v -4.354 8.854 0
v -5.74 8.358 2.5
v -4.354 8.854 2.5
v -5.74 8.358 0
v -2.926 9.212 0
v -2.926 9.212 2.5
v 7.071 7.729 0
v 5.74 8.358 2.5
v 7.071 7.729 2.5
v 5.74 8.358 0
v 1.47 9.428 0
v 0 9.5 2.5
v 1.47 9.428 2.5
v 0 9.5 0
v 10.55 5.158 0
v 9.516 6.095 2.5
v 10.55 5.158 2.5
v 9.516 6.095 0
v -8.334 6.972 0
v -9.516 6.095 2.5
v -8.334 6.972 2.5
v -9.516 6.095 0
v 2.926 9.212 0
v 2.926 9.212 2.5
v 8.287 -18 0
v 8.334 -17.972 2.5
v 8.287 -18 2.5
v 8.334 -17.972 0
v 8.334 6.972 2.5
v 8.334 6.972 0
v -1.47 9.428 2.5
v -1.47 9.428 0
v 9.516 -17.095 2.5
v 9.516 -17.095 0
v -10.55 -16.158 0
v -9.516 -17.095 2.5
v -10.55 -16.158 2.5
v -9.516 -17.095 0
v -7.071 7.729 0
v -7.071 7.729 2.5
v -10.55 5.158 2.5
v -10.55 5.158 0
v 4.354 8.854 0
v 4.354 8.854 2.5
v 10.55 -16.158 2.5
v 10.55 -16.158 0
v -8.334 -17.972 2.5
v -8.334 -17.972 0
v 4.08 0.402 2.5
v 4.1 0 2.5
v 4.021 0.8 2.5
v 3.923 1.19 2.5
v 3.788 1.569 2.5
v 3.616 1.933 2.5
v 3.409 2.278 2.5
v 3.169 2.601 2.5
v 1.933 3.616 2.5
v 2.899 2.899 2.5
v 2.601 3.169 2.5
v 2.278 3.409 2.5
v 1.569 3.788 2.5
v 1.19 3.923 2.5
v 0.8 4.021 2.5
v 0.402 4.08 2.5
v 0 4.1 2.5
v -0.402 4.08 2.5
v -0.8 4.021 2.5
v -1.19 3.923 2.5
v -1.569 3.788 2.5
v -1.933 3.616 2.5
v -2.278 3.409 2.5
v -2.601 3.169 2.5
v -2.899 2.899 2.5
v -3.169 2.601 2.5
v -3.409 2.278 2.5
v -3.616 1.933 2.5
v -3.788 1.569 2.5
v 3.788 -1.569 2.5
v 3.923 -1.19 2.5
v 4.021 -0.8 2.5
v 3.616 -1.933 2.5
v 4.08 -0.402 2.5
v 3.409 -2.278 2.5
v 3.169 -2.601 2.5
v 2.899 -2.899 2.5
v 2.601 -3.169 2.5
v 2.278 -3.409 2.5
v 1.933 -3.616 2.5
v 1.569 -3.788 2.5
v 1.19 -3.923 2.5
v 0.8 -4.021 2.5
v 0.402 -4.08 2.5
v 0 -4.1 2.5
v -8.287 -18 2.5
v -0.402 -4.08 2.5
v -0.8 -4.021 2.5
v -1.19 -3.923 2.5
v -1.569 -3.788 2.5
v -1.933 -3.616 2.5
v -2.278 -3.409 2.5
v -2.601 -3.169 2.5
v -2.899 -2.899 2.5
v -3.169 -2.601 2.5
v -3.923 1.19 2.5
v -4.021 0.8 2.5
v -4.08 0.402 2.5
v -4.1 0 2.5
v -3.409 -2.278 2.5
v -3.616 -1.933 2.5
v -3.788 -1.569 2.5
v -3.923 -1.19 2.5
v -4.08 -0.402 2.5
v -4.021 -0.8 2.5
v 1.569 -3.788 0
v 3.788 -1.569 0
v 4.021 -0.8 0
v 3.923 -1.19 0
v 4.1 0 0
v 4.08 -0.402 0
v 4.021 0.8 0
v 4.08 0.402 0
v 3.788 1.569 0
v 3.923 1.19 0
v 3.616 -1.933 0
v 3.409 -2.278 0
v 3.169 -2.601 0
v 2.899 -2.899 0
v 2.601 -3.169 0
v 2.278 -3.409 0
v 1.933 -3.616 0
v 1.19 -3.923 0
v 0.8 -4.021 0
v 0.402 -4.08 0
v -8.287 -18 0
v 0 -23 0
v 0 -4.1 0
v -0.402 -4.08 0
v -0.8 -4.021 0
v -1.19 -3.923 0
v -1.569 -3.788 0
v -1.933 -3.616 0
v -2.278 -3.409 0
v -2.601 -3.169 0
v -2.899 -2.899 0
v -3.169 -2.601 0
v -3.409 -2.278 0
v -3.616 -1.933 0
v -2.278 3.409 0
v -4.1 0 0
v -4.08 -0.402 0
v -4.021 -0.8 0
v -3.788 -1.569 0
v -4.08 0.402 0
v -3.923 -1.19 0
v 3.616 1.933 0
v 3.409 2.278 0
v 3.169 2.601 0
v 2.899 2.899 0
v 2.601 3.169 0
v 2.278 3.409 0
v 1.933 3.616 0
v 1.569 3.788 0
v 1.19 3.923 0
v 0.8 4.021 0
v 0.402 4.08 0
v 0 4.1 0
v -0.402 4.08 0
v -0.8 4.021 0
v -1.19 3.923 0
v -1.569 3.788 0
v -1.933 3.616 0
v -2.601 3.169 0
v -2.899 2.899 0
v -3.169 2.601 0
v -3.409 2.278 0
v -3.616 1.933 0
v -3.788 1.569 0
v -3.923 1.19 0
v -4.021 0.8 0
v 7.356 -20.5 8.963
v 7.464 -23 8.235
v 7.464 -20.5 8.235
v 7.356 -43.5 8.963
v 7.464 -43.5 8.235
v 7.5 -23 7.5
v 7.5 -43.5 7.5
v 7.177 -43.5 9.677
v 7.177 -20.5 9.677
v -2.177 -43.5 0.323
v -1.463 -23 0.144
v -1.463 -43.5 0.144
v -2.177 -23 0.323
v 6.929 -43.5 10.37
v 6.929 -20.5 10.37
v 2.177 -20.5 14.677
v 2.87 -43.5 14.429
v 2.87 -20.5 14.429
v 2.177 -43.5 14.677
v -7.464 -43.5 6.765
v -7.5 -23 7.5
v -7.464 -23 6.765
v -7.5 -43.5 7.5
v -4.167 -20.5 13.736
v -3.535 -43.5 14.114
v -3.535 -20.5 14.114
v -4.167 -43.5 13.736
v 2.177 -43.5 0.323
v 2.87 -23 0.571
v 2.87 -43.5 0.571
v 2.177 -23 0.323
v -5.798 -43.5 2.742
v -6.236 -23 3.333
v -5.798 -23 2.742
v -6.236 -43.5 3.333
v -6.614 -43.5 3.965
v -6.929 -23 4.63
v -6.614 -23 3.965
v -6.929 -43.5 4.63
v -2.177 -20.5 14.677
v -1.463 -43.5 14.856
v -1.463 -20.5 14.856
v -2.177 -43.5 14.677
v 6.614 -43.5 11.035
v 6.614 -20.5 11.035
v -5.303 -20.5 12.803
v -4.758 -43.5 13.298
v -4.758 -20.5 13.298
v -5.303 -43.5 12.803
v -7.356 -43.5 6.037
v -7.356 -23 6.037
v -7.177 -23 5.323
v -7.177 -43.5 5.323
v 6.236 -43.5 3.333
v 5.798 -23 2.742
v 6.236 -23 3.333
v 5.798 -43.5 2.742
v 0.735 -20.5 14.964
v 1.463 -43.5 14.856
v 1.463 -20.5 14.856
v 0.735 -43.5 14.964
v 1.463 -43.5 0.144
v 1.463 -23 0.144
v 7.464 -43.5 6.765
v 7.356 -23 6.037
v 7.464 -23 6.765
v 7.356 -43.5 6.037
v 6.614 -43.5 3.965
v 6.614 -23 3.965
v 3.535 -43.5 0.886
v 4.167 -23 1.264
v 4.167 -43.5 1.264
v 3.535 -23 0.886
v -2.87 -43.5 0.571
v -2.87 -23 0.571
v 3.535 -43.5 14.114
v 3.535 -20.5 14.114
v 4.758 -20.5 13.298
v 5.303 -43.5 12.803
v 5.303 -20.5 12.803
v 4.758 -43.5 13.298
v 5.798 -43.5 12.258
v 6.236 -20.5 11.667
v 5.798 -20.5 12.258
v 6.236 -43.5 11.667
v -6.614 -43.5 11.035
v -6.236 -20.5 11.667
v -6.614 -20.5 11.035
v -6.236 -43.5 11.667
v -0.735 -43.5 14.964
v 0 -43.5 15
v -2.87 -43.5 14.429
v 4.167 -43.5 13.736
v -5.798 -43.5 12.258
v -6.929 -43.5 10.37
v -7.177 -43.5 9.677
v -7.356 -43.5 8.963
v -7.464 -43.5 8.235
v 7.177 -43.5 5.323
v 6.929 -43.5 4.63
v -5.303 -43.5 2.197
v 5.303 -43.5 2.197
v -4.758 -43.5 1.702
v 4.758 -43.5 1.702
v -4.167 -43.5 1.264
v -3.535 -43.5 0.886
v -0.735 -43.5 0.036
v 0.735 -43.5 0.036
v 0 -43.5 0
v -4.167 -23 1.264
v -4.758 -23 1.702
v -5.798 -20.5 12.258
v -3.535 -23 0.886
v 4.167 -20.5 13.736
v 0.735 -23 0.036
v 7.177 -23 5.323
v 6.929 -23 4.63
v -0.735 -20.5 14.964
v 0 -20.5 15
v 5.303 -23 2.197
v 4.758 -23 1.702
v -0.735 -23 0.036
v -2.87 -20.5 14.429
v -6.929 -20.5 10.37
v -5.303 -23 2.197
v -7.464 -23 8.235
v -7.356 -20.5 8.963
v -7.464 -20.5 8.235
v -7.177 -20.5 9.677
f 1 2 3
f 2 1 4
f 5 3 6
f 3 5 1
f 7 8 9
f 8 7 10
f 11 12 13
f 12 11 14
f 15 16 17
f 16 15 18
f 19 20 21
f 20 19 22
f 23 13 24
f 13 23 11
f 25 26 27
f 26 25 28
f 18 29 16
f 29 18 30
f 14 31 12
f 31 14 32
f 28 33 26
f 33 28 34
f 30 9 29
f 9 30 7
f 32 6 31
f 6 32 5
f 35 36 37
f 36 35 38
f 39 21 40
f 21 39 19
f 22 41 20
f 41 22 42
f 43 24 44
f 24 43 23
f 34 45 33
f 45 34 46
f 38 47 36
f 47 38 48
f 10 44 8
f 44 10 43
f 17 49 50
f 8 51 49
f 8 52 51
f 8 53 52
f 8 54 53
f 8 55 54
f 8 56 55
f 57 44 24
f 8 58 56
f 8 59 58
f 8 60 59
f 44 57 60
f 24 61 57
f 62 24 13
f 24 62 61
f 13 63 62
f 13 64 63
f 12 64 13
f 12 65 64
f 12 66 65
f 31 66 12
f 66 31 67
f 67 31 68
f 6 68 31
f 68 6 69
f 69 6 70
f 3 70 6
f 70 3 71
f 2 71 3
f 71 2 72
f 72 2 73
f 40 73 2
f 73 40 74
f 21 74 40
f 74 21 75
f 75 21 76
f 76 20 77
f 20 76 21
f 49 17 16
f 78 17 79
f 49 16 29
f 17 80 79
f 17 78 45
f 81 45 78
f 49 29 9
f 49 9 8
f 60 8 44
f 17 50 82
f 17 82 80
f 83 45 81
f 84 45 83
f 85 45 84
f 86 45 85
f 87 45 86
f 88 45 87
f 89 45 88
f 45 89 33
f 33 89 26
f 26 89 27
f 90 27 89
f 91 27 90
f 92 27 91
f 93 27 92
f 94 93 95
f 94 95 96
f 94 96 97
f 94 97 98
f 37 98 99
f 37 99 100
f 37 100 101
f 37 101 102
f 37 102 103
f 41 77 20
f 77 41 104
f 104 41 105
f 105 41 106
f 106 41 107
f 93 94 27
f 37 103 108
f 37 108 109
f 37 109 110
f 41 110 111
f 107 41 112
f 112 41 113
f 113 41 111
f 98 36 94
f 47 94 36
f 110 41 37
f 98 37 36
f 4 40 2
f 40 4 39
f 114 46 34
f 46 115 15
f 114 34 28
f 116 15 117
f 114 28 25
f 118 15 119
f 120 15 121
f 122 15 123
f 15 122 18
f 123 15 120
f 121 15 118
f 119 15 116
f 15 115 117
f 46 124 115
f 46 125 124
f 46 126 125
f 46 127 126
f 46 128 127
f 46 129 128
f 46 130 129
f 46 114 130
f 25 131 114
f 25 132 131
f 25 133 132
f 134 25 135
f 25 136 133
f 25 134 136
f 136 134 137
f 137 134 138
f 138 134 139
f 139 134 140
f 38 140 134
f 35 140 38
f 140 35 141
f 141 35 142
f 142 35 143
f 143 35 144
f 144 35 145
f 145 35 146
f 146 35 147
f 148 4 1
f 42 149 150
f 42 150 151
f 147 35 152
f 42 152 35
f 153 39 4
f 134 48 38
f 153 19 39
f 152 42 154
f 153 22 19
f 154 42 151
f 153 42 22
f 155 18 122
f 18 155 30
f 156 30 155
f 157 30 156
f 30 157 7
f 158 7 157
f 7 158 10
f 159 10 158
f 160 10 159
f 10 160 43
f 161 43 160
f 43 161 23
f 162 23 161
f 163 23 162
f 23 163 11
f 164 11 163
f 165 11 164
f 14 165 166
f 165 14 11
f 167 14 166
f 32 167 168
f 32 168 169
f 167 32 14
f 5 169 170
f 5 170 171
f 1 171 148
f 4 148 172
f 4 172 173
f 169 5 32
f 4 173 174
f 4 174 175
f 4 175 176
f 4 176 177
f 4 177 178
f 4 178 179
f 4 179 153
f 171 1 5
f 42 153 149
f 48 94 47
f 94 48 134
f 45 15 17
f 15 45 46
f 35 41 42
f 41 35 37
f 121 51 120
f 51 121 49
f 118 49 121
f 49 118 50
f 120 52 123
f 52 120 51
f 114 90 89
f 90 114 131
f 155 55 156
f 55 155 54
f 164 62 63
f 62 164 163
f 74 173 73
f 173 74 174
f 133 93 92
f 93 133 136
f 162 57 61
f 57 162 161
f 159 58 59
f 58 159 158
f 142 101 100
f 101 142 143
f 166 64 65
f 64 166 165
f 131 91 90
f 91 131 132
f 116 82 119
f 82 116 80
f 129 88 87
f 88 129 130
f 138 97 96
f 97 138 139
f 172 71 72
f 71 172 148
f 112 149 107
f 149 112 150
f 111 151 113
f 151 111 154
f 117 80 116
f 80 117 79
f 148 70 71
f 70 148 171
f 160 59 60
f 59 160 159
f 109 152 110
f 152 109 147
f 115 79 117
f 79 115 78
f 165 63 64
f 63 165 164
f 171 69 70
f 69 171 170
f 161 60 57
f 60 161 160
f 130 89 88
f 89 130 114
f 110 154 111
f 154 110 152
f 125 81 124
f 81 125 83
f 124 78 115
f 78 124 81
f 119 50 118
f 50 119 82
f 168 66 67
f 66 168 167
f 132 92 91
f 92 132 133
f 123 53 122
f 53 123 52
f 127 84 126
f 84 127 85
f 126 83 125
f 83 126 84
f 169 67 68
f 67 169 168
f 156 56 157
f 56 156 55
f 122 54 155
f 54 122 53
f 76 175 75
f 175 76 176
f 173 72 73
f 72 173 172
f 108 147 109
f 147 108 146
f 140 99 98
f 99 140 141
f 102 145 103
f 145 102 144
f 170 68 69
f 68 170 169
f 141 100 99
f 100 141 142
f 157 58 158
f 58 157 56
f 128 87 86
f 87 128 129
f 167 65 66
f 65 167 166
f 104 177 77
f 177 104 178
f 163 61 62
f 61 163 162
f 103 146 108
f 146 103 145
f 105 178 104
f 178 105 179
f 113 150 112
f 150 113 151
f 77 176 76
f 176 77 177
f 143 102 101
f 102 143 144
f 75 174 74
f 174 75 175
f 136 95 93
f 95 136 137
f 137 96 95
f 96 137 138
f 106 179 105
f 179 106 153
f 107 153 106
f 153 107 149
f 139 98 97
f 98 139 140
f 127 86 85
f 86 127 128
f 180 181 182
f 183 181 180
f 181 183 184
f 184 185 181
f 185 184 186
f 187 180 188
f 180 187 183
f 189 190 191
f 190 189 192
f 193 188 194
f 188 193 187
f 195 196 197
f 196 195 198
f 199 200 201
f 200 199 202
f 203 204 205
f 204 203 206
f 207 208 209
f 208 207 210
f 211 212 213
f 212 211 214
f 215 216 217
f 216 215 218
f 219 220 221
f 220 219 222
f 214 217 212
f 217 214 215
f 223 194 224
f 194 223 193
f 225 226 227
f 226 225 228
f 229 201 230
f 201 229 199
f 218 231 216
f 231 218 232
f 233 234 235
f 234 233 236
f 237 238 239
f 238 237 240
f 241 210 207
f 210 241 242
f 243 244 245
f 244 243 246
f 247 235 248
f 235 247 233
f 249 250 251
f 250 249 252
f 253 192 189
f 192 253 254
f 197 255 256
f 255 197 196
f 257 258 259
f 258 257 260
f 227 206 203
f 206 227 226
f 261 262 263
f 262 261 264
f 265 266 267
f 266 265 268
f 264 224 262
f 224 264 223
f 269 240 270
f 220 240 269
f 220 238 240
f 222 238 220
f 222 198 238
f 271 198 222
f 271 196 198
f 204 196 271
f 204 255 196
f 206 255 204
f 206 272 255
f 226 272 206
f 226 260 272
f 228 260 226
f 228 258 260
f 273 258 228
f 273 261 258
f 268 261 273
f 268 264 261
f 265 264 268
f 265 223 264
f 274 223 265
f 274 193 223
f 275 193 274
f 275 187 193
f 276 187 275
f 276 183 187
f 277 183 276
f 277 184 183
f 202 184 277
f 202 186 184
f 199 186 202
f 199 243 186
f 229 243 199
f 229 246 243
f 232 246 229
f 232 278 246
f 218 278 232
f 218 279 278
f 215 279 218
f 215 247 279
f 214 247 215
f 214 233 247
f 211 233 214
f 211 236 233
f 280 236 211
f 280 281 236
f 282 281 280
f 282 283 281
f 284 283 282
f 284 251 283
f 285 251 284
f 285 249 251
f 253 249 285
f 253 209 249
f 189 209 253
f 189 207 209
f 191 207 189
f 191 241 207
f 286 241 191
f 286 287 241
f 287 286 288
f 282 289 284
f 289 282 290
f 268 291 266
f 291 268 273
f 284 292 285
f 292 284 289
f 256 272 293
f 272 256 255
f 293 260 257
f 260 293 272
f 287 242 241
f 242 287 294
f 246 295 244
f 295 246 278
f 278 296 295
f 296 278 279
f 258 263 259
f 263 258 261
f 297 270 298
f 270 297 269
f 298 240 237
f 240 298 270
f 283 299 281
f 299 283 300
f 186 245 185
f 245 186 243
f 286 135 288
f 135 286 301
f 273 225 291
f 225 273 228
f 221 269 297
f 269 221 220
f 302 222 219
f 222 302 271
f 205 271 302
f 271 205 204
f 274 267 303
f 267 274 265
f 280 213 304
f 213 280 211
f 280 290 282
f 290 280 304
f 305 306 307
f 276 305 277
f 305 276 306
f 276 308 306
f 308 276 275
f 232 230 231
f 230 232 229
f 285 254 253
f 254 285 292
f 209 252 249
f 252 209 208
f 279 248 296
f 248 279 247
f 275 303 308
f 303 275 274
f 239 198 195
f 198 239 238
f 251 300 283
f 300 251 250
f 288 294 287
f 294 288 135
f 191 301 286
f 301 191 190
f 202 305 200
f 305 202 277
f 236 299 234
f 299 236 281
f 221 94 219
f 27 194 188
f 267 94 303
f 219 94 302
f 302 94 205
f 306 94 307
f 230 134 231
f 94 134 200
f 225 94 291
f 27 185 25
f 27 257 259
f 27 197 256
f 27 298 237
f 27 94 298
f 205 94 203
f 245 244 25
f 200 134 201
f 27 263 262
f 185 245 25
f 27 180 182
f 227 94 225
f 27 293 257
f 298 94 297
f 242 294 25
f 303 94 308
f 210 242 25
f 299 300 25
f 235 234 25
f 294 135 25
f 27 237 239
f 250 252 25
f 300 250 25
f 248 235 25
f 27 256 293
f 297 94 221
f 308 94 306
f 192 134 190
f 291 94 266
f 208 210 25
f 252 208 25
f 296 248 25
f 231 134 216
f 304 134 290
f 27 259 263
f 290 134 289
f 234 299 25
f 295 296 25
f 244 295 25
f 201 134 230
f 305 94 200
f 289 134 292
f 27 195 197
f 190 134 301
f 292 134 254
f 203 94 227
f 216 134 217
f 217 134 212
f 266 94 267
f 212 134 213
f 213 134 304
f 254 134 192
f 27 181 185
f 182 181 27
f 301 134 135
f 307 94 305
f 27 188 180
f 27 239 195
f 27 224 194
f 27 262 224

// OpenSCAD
// file: colors.scad
module copper() {
  color("#b87333") children();
}

module nickel() {
  color("#9a9590") children();
}

module pcb() {
  color("#008c32") children();
}

module clear_acrylic() {
  color("#ffffff10") children();
}
// file: parameters.scad
$fn = 64;

h = 70.6; // cell max height
d = 21.5; // cell max diameter

available_y = 19.5 * 25.4;

aluminum_thickness = 0.04 * 25.4; // 5052 H32 Aluminum for the case
case_dim_x = 137; // external dimensions, must be 137 to match the EIG battery box
case_dim_y = 228; // 235 is the max, can be smaller
case_dim_z = 355; // 

external_walls = 3; // acrylic

base_plate_dim_x = case_dim_x - 2 * external_walls;
base_plate_dim_y = case_dim_y - 2 * external_walls;

cell_isolation = 1; // minimum separation between cells not in parallel

plate_disk_dia = 14;
copper_width = 10;
copper_length = 9.8 * d;

nickel_width = 8;
nickel_length = 5.8 * d; // length of the nickel strip to connect 6 cells

plate_slot_length = 8;
plate_slot_width = 0.7;
copper_plate_thickness = 0.15;
nickel_plate_thickness = 0.15;
strips_pocket_height = 1;

plates_thickness = copper_plate_thickness + nickel_plate_thickness;

bulkhead_thickness = 20;

strips_clearance = 0.5;
holder_pocket_height = 5;
holder_walls = 0.5;

exploded = $t * 50;

inlet_stack_height = 20;
outlet_walls = 3;

m3_insert_od = 4.6; // 5mm OD minus some plastic to melt
m3_insert_length = 4 + 4; // 4 mm more than the insert length

m4_insert_od = 5.3; // this is the diameter of the hole, it must be smaller than the insert’s maximum OD
m4_insert_length = 8; // 2 mm more than the insert length

cell_holder_stack_height = 0.3;

strips_insulator_stack_height = 1.2;

module_60_height = h + cell_holder_stack_height * 2 + strips_insulator_stack_height * 2 + 7 * exploded;

large_spacer_stack_height = 7;

module_120_height = module_60_height * 2 + large_spacer_stack_height + exploded;

module_240_height = module_120_height * 2 + large_spacer_stack_height * 3 + exploded;

inlet_walls = 3;

ring_terminal_cutout_depth = 3;
busbar_cutout_depth = 3;
busbar_thickness = 1;
// main file
include <parameters.scad>
use <colors.scad>

module crimp_terminal_awg2_0() {
  module base_shape() {
    difference() {
      intersection() {
        translate([0, -15 + 8 / 2 + 5.5, 0])
          cylinder(d=30, h=2.5);
        cube([21.1, 100, 100], center=true);
      }
      cylinder(d=8.2, h=100, center=true);
    }
    translate([0, -15 + 8 / 2 + 5.5 - 15, 7.5])
      rotate([90, 0, 0])
        cylinder(d=15, h=53 - 30);
  }

  module modifier() {
    translate([0, -15 + 8 / 2 + 5.5 - 15, 0])
      cube([100, 5, 100], center=true);
  }

  copper() union() {
      hull() {
        intersection() {
          base_shape();
          modifier();
        }
      }
      difference() {
        base_shape();
        modifier();
      }
    }
}

crimp_terminal_awg2_0();
